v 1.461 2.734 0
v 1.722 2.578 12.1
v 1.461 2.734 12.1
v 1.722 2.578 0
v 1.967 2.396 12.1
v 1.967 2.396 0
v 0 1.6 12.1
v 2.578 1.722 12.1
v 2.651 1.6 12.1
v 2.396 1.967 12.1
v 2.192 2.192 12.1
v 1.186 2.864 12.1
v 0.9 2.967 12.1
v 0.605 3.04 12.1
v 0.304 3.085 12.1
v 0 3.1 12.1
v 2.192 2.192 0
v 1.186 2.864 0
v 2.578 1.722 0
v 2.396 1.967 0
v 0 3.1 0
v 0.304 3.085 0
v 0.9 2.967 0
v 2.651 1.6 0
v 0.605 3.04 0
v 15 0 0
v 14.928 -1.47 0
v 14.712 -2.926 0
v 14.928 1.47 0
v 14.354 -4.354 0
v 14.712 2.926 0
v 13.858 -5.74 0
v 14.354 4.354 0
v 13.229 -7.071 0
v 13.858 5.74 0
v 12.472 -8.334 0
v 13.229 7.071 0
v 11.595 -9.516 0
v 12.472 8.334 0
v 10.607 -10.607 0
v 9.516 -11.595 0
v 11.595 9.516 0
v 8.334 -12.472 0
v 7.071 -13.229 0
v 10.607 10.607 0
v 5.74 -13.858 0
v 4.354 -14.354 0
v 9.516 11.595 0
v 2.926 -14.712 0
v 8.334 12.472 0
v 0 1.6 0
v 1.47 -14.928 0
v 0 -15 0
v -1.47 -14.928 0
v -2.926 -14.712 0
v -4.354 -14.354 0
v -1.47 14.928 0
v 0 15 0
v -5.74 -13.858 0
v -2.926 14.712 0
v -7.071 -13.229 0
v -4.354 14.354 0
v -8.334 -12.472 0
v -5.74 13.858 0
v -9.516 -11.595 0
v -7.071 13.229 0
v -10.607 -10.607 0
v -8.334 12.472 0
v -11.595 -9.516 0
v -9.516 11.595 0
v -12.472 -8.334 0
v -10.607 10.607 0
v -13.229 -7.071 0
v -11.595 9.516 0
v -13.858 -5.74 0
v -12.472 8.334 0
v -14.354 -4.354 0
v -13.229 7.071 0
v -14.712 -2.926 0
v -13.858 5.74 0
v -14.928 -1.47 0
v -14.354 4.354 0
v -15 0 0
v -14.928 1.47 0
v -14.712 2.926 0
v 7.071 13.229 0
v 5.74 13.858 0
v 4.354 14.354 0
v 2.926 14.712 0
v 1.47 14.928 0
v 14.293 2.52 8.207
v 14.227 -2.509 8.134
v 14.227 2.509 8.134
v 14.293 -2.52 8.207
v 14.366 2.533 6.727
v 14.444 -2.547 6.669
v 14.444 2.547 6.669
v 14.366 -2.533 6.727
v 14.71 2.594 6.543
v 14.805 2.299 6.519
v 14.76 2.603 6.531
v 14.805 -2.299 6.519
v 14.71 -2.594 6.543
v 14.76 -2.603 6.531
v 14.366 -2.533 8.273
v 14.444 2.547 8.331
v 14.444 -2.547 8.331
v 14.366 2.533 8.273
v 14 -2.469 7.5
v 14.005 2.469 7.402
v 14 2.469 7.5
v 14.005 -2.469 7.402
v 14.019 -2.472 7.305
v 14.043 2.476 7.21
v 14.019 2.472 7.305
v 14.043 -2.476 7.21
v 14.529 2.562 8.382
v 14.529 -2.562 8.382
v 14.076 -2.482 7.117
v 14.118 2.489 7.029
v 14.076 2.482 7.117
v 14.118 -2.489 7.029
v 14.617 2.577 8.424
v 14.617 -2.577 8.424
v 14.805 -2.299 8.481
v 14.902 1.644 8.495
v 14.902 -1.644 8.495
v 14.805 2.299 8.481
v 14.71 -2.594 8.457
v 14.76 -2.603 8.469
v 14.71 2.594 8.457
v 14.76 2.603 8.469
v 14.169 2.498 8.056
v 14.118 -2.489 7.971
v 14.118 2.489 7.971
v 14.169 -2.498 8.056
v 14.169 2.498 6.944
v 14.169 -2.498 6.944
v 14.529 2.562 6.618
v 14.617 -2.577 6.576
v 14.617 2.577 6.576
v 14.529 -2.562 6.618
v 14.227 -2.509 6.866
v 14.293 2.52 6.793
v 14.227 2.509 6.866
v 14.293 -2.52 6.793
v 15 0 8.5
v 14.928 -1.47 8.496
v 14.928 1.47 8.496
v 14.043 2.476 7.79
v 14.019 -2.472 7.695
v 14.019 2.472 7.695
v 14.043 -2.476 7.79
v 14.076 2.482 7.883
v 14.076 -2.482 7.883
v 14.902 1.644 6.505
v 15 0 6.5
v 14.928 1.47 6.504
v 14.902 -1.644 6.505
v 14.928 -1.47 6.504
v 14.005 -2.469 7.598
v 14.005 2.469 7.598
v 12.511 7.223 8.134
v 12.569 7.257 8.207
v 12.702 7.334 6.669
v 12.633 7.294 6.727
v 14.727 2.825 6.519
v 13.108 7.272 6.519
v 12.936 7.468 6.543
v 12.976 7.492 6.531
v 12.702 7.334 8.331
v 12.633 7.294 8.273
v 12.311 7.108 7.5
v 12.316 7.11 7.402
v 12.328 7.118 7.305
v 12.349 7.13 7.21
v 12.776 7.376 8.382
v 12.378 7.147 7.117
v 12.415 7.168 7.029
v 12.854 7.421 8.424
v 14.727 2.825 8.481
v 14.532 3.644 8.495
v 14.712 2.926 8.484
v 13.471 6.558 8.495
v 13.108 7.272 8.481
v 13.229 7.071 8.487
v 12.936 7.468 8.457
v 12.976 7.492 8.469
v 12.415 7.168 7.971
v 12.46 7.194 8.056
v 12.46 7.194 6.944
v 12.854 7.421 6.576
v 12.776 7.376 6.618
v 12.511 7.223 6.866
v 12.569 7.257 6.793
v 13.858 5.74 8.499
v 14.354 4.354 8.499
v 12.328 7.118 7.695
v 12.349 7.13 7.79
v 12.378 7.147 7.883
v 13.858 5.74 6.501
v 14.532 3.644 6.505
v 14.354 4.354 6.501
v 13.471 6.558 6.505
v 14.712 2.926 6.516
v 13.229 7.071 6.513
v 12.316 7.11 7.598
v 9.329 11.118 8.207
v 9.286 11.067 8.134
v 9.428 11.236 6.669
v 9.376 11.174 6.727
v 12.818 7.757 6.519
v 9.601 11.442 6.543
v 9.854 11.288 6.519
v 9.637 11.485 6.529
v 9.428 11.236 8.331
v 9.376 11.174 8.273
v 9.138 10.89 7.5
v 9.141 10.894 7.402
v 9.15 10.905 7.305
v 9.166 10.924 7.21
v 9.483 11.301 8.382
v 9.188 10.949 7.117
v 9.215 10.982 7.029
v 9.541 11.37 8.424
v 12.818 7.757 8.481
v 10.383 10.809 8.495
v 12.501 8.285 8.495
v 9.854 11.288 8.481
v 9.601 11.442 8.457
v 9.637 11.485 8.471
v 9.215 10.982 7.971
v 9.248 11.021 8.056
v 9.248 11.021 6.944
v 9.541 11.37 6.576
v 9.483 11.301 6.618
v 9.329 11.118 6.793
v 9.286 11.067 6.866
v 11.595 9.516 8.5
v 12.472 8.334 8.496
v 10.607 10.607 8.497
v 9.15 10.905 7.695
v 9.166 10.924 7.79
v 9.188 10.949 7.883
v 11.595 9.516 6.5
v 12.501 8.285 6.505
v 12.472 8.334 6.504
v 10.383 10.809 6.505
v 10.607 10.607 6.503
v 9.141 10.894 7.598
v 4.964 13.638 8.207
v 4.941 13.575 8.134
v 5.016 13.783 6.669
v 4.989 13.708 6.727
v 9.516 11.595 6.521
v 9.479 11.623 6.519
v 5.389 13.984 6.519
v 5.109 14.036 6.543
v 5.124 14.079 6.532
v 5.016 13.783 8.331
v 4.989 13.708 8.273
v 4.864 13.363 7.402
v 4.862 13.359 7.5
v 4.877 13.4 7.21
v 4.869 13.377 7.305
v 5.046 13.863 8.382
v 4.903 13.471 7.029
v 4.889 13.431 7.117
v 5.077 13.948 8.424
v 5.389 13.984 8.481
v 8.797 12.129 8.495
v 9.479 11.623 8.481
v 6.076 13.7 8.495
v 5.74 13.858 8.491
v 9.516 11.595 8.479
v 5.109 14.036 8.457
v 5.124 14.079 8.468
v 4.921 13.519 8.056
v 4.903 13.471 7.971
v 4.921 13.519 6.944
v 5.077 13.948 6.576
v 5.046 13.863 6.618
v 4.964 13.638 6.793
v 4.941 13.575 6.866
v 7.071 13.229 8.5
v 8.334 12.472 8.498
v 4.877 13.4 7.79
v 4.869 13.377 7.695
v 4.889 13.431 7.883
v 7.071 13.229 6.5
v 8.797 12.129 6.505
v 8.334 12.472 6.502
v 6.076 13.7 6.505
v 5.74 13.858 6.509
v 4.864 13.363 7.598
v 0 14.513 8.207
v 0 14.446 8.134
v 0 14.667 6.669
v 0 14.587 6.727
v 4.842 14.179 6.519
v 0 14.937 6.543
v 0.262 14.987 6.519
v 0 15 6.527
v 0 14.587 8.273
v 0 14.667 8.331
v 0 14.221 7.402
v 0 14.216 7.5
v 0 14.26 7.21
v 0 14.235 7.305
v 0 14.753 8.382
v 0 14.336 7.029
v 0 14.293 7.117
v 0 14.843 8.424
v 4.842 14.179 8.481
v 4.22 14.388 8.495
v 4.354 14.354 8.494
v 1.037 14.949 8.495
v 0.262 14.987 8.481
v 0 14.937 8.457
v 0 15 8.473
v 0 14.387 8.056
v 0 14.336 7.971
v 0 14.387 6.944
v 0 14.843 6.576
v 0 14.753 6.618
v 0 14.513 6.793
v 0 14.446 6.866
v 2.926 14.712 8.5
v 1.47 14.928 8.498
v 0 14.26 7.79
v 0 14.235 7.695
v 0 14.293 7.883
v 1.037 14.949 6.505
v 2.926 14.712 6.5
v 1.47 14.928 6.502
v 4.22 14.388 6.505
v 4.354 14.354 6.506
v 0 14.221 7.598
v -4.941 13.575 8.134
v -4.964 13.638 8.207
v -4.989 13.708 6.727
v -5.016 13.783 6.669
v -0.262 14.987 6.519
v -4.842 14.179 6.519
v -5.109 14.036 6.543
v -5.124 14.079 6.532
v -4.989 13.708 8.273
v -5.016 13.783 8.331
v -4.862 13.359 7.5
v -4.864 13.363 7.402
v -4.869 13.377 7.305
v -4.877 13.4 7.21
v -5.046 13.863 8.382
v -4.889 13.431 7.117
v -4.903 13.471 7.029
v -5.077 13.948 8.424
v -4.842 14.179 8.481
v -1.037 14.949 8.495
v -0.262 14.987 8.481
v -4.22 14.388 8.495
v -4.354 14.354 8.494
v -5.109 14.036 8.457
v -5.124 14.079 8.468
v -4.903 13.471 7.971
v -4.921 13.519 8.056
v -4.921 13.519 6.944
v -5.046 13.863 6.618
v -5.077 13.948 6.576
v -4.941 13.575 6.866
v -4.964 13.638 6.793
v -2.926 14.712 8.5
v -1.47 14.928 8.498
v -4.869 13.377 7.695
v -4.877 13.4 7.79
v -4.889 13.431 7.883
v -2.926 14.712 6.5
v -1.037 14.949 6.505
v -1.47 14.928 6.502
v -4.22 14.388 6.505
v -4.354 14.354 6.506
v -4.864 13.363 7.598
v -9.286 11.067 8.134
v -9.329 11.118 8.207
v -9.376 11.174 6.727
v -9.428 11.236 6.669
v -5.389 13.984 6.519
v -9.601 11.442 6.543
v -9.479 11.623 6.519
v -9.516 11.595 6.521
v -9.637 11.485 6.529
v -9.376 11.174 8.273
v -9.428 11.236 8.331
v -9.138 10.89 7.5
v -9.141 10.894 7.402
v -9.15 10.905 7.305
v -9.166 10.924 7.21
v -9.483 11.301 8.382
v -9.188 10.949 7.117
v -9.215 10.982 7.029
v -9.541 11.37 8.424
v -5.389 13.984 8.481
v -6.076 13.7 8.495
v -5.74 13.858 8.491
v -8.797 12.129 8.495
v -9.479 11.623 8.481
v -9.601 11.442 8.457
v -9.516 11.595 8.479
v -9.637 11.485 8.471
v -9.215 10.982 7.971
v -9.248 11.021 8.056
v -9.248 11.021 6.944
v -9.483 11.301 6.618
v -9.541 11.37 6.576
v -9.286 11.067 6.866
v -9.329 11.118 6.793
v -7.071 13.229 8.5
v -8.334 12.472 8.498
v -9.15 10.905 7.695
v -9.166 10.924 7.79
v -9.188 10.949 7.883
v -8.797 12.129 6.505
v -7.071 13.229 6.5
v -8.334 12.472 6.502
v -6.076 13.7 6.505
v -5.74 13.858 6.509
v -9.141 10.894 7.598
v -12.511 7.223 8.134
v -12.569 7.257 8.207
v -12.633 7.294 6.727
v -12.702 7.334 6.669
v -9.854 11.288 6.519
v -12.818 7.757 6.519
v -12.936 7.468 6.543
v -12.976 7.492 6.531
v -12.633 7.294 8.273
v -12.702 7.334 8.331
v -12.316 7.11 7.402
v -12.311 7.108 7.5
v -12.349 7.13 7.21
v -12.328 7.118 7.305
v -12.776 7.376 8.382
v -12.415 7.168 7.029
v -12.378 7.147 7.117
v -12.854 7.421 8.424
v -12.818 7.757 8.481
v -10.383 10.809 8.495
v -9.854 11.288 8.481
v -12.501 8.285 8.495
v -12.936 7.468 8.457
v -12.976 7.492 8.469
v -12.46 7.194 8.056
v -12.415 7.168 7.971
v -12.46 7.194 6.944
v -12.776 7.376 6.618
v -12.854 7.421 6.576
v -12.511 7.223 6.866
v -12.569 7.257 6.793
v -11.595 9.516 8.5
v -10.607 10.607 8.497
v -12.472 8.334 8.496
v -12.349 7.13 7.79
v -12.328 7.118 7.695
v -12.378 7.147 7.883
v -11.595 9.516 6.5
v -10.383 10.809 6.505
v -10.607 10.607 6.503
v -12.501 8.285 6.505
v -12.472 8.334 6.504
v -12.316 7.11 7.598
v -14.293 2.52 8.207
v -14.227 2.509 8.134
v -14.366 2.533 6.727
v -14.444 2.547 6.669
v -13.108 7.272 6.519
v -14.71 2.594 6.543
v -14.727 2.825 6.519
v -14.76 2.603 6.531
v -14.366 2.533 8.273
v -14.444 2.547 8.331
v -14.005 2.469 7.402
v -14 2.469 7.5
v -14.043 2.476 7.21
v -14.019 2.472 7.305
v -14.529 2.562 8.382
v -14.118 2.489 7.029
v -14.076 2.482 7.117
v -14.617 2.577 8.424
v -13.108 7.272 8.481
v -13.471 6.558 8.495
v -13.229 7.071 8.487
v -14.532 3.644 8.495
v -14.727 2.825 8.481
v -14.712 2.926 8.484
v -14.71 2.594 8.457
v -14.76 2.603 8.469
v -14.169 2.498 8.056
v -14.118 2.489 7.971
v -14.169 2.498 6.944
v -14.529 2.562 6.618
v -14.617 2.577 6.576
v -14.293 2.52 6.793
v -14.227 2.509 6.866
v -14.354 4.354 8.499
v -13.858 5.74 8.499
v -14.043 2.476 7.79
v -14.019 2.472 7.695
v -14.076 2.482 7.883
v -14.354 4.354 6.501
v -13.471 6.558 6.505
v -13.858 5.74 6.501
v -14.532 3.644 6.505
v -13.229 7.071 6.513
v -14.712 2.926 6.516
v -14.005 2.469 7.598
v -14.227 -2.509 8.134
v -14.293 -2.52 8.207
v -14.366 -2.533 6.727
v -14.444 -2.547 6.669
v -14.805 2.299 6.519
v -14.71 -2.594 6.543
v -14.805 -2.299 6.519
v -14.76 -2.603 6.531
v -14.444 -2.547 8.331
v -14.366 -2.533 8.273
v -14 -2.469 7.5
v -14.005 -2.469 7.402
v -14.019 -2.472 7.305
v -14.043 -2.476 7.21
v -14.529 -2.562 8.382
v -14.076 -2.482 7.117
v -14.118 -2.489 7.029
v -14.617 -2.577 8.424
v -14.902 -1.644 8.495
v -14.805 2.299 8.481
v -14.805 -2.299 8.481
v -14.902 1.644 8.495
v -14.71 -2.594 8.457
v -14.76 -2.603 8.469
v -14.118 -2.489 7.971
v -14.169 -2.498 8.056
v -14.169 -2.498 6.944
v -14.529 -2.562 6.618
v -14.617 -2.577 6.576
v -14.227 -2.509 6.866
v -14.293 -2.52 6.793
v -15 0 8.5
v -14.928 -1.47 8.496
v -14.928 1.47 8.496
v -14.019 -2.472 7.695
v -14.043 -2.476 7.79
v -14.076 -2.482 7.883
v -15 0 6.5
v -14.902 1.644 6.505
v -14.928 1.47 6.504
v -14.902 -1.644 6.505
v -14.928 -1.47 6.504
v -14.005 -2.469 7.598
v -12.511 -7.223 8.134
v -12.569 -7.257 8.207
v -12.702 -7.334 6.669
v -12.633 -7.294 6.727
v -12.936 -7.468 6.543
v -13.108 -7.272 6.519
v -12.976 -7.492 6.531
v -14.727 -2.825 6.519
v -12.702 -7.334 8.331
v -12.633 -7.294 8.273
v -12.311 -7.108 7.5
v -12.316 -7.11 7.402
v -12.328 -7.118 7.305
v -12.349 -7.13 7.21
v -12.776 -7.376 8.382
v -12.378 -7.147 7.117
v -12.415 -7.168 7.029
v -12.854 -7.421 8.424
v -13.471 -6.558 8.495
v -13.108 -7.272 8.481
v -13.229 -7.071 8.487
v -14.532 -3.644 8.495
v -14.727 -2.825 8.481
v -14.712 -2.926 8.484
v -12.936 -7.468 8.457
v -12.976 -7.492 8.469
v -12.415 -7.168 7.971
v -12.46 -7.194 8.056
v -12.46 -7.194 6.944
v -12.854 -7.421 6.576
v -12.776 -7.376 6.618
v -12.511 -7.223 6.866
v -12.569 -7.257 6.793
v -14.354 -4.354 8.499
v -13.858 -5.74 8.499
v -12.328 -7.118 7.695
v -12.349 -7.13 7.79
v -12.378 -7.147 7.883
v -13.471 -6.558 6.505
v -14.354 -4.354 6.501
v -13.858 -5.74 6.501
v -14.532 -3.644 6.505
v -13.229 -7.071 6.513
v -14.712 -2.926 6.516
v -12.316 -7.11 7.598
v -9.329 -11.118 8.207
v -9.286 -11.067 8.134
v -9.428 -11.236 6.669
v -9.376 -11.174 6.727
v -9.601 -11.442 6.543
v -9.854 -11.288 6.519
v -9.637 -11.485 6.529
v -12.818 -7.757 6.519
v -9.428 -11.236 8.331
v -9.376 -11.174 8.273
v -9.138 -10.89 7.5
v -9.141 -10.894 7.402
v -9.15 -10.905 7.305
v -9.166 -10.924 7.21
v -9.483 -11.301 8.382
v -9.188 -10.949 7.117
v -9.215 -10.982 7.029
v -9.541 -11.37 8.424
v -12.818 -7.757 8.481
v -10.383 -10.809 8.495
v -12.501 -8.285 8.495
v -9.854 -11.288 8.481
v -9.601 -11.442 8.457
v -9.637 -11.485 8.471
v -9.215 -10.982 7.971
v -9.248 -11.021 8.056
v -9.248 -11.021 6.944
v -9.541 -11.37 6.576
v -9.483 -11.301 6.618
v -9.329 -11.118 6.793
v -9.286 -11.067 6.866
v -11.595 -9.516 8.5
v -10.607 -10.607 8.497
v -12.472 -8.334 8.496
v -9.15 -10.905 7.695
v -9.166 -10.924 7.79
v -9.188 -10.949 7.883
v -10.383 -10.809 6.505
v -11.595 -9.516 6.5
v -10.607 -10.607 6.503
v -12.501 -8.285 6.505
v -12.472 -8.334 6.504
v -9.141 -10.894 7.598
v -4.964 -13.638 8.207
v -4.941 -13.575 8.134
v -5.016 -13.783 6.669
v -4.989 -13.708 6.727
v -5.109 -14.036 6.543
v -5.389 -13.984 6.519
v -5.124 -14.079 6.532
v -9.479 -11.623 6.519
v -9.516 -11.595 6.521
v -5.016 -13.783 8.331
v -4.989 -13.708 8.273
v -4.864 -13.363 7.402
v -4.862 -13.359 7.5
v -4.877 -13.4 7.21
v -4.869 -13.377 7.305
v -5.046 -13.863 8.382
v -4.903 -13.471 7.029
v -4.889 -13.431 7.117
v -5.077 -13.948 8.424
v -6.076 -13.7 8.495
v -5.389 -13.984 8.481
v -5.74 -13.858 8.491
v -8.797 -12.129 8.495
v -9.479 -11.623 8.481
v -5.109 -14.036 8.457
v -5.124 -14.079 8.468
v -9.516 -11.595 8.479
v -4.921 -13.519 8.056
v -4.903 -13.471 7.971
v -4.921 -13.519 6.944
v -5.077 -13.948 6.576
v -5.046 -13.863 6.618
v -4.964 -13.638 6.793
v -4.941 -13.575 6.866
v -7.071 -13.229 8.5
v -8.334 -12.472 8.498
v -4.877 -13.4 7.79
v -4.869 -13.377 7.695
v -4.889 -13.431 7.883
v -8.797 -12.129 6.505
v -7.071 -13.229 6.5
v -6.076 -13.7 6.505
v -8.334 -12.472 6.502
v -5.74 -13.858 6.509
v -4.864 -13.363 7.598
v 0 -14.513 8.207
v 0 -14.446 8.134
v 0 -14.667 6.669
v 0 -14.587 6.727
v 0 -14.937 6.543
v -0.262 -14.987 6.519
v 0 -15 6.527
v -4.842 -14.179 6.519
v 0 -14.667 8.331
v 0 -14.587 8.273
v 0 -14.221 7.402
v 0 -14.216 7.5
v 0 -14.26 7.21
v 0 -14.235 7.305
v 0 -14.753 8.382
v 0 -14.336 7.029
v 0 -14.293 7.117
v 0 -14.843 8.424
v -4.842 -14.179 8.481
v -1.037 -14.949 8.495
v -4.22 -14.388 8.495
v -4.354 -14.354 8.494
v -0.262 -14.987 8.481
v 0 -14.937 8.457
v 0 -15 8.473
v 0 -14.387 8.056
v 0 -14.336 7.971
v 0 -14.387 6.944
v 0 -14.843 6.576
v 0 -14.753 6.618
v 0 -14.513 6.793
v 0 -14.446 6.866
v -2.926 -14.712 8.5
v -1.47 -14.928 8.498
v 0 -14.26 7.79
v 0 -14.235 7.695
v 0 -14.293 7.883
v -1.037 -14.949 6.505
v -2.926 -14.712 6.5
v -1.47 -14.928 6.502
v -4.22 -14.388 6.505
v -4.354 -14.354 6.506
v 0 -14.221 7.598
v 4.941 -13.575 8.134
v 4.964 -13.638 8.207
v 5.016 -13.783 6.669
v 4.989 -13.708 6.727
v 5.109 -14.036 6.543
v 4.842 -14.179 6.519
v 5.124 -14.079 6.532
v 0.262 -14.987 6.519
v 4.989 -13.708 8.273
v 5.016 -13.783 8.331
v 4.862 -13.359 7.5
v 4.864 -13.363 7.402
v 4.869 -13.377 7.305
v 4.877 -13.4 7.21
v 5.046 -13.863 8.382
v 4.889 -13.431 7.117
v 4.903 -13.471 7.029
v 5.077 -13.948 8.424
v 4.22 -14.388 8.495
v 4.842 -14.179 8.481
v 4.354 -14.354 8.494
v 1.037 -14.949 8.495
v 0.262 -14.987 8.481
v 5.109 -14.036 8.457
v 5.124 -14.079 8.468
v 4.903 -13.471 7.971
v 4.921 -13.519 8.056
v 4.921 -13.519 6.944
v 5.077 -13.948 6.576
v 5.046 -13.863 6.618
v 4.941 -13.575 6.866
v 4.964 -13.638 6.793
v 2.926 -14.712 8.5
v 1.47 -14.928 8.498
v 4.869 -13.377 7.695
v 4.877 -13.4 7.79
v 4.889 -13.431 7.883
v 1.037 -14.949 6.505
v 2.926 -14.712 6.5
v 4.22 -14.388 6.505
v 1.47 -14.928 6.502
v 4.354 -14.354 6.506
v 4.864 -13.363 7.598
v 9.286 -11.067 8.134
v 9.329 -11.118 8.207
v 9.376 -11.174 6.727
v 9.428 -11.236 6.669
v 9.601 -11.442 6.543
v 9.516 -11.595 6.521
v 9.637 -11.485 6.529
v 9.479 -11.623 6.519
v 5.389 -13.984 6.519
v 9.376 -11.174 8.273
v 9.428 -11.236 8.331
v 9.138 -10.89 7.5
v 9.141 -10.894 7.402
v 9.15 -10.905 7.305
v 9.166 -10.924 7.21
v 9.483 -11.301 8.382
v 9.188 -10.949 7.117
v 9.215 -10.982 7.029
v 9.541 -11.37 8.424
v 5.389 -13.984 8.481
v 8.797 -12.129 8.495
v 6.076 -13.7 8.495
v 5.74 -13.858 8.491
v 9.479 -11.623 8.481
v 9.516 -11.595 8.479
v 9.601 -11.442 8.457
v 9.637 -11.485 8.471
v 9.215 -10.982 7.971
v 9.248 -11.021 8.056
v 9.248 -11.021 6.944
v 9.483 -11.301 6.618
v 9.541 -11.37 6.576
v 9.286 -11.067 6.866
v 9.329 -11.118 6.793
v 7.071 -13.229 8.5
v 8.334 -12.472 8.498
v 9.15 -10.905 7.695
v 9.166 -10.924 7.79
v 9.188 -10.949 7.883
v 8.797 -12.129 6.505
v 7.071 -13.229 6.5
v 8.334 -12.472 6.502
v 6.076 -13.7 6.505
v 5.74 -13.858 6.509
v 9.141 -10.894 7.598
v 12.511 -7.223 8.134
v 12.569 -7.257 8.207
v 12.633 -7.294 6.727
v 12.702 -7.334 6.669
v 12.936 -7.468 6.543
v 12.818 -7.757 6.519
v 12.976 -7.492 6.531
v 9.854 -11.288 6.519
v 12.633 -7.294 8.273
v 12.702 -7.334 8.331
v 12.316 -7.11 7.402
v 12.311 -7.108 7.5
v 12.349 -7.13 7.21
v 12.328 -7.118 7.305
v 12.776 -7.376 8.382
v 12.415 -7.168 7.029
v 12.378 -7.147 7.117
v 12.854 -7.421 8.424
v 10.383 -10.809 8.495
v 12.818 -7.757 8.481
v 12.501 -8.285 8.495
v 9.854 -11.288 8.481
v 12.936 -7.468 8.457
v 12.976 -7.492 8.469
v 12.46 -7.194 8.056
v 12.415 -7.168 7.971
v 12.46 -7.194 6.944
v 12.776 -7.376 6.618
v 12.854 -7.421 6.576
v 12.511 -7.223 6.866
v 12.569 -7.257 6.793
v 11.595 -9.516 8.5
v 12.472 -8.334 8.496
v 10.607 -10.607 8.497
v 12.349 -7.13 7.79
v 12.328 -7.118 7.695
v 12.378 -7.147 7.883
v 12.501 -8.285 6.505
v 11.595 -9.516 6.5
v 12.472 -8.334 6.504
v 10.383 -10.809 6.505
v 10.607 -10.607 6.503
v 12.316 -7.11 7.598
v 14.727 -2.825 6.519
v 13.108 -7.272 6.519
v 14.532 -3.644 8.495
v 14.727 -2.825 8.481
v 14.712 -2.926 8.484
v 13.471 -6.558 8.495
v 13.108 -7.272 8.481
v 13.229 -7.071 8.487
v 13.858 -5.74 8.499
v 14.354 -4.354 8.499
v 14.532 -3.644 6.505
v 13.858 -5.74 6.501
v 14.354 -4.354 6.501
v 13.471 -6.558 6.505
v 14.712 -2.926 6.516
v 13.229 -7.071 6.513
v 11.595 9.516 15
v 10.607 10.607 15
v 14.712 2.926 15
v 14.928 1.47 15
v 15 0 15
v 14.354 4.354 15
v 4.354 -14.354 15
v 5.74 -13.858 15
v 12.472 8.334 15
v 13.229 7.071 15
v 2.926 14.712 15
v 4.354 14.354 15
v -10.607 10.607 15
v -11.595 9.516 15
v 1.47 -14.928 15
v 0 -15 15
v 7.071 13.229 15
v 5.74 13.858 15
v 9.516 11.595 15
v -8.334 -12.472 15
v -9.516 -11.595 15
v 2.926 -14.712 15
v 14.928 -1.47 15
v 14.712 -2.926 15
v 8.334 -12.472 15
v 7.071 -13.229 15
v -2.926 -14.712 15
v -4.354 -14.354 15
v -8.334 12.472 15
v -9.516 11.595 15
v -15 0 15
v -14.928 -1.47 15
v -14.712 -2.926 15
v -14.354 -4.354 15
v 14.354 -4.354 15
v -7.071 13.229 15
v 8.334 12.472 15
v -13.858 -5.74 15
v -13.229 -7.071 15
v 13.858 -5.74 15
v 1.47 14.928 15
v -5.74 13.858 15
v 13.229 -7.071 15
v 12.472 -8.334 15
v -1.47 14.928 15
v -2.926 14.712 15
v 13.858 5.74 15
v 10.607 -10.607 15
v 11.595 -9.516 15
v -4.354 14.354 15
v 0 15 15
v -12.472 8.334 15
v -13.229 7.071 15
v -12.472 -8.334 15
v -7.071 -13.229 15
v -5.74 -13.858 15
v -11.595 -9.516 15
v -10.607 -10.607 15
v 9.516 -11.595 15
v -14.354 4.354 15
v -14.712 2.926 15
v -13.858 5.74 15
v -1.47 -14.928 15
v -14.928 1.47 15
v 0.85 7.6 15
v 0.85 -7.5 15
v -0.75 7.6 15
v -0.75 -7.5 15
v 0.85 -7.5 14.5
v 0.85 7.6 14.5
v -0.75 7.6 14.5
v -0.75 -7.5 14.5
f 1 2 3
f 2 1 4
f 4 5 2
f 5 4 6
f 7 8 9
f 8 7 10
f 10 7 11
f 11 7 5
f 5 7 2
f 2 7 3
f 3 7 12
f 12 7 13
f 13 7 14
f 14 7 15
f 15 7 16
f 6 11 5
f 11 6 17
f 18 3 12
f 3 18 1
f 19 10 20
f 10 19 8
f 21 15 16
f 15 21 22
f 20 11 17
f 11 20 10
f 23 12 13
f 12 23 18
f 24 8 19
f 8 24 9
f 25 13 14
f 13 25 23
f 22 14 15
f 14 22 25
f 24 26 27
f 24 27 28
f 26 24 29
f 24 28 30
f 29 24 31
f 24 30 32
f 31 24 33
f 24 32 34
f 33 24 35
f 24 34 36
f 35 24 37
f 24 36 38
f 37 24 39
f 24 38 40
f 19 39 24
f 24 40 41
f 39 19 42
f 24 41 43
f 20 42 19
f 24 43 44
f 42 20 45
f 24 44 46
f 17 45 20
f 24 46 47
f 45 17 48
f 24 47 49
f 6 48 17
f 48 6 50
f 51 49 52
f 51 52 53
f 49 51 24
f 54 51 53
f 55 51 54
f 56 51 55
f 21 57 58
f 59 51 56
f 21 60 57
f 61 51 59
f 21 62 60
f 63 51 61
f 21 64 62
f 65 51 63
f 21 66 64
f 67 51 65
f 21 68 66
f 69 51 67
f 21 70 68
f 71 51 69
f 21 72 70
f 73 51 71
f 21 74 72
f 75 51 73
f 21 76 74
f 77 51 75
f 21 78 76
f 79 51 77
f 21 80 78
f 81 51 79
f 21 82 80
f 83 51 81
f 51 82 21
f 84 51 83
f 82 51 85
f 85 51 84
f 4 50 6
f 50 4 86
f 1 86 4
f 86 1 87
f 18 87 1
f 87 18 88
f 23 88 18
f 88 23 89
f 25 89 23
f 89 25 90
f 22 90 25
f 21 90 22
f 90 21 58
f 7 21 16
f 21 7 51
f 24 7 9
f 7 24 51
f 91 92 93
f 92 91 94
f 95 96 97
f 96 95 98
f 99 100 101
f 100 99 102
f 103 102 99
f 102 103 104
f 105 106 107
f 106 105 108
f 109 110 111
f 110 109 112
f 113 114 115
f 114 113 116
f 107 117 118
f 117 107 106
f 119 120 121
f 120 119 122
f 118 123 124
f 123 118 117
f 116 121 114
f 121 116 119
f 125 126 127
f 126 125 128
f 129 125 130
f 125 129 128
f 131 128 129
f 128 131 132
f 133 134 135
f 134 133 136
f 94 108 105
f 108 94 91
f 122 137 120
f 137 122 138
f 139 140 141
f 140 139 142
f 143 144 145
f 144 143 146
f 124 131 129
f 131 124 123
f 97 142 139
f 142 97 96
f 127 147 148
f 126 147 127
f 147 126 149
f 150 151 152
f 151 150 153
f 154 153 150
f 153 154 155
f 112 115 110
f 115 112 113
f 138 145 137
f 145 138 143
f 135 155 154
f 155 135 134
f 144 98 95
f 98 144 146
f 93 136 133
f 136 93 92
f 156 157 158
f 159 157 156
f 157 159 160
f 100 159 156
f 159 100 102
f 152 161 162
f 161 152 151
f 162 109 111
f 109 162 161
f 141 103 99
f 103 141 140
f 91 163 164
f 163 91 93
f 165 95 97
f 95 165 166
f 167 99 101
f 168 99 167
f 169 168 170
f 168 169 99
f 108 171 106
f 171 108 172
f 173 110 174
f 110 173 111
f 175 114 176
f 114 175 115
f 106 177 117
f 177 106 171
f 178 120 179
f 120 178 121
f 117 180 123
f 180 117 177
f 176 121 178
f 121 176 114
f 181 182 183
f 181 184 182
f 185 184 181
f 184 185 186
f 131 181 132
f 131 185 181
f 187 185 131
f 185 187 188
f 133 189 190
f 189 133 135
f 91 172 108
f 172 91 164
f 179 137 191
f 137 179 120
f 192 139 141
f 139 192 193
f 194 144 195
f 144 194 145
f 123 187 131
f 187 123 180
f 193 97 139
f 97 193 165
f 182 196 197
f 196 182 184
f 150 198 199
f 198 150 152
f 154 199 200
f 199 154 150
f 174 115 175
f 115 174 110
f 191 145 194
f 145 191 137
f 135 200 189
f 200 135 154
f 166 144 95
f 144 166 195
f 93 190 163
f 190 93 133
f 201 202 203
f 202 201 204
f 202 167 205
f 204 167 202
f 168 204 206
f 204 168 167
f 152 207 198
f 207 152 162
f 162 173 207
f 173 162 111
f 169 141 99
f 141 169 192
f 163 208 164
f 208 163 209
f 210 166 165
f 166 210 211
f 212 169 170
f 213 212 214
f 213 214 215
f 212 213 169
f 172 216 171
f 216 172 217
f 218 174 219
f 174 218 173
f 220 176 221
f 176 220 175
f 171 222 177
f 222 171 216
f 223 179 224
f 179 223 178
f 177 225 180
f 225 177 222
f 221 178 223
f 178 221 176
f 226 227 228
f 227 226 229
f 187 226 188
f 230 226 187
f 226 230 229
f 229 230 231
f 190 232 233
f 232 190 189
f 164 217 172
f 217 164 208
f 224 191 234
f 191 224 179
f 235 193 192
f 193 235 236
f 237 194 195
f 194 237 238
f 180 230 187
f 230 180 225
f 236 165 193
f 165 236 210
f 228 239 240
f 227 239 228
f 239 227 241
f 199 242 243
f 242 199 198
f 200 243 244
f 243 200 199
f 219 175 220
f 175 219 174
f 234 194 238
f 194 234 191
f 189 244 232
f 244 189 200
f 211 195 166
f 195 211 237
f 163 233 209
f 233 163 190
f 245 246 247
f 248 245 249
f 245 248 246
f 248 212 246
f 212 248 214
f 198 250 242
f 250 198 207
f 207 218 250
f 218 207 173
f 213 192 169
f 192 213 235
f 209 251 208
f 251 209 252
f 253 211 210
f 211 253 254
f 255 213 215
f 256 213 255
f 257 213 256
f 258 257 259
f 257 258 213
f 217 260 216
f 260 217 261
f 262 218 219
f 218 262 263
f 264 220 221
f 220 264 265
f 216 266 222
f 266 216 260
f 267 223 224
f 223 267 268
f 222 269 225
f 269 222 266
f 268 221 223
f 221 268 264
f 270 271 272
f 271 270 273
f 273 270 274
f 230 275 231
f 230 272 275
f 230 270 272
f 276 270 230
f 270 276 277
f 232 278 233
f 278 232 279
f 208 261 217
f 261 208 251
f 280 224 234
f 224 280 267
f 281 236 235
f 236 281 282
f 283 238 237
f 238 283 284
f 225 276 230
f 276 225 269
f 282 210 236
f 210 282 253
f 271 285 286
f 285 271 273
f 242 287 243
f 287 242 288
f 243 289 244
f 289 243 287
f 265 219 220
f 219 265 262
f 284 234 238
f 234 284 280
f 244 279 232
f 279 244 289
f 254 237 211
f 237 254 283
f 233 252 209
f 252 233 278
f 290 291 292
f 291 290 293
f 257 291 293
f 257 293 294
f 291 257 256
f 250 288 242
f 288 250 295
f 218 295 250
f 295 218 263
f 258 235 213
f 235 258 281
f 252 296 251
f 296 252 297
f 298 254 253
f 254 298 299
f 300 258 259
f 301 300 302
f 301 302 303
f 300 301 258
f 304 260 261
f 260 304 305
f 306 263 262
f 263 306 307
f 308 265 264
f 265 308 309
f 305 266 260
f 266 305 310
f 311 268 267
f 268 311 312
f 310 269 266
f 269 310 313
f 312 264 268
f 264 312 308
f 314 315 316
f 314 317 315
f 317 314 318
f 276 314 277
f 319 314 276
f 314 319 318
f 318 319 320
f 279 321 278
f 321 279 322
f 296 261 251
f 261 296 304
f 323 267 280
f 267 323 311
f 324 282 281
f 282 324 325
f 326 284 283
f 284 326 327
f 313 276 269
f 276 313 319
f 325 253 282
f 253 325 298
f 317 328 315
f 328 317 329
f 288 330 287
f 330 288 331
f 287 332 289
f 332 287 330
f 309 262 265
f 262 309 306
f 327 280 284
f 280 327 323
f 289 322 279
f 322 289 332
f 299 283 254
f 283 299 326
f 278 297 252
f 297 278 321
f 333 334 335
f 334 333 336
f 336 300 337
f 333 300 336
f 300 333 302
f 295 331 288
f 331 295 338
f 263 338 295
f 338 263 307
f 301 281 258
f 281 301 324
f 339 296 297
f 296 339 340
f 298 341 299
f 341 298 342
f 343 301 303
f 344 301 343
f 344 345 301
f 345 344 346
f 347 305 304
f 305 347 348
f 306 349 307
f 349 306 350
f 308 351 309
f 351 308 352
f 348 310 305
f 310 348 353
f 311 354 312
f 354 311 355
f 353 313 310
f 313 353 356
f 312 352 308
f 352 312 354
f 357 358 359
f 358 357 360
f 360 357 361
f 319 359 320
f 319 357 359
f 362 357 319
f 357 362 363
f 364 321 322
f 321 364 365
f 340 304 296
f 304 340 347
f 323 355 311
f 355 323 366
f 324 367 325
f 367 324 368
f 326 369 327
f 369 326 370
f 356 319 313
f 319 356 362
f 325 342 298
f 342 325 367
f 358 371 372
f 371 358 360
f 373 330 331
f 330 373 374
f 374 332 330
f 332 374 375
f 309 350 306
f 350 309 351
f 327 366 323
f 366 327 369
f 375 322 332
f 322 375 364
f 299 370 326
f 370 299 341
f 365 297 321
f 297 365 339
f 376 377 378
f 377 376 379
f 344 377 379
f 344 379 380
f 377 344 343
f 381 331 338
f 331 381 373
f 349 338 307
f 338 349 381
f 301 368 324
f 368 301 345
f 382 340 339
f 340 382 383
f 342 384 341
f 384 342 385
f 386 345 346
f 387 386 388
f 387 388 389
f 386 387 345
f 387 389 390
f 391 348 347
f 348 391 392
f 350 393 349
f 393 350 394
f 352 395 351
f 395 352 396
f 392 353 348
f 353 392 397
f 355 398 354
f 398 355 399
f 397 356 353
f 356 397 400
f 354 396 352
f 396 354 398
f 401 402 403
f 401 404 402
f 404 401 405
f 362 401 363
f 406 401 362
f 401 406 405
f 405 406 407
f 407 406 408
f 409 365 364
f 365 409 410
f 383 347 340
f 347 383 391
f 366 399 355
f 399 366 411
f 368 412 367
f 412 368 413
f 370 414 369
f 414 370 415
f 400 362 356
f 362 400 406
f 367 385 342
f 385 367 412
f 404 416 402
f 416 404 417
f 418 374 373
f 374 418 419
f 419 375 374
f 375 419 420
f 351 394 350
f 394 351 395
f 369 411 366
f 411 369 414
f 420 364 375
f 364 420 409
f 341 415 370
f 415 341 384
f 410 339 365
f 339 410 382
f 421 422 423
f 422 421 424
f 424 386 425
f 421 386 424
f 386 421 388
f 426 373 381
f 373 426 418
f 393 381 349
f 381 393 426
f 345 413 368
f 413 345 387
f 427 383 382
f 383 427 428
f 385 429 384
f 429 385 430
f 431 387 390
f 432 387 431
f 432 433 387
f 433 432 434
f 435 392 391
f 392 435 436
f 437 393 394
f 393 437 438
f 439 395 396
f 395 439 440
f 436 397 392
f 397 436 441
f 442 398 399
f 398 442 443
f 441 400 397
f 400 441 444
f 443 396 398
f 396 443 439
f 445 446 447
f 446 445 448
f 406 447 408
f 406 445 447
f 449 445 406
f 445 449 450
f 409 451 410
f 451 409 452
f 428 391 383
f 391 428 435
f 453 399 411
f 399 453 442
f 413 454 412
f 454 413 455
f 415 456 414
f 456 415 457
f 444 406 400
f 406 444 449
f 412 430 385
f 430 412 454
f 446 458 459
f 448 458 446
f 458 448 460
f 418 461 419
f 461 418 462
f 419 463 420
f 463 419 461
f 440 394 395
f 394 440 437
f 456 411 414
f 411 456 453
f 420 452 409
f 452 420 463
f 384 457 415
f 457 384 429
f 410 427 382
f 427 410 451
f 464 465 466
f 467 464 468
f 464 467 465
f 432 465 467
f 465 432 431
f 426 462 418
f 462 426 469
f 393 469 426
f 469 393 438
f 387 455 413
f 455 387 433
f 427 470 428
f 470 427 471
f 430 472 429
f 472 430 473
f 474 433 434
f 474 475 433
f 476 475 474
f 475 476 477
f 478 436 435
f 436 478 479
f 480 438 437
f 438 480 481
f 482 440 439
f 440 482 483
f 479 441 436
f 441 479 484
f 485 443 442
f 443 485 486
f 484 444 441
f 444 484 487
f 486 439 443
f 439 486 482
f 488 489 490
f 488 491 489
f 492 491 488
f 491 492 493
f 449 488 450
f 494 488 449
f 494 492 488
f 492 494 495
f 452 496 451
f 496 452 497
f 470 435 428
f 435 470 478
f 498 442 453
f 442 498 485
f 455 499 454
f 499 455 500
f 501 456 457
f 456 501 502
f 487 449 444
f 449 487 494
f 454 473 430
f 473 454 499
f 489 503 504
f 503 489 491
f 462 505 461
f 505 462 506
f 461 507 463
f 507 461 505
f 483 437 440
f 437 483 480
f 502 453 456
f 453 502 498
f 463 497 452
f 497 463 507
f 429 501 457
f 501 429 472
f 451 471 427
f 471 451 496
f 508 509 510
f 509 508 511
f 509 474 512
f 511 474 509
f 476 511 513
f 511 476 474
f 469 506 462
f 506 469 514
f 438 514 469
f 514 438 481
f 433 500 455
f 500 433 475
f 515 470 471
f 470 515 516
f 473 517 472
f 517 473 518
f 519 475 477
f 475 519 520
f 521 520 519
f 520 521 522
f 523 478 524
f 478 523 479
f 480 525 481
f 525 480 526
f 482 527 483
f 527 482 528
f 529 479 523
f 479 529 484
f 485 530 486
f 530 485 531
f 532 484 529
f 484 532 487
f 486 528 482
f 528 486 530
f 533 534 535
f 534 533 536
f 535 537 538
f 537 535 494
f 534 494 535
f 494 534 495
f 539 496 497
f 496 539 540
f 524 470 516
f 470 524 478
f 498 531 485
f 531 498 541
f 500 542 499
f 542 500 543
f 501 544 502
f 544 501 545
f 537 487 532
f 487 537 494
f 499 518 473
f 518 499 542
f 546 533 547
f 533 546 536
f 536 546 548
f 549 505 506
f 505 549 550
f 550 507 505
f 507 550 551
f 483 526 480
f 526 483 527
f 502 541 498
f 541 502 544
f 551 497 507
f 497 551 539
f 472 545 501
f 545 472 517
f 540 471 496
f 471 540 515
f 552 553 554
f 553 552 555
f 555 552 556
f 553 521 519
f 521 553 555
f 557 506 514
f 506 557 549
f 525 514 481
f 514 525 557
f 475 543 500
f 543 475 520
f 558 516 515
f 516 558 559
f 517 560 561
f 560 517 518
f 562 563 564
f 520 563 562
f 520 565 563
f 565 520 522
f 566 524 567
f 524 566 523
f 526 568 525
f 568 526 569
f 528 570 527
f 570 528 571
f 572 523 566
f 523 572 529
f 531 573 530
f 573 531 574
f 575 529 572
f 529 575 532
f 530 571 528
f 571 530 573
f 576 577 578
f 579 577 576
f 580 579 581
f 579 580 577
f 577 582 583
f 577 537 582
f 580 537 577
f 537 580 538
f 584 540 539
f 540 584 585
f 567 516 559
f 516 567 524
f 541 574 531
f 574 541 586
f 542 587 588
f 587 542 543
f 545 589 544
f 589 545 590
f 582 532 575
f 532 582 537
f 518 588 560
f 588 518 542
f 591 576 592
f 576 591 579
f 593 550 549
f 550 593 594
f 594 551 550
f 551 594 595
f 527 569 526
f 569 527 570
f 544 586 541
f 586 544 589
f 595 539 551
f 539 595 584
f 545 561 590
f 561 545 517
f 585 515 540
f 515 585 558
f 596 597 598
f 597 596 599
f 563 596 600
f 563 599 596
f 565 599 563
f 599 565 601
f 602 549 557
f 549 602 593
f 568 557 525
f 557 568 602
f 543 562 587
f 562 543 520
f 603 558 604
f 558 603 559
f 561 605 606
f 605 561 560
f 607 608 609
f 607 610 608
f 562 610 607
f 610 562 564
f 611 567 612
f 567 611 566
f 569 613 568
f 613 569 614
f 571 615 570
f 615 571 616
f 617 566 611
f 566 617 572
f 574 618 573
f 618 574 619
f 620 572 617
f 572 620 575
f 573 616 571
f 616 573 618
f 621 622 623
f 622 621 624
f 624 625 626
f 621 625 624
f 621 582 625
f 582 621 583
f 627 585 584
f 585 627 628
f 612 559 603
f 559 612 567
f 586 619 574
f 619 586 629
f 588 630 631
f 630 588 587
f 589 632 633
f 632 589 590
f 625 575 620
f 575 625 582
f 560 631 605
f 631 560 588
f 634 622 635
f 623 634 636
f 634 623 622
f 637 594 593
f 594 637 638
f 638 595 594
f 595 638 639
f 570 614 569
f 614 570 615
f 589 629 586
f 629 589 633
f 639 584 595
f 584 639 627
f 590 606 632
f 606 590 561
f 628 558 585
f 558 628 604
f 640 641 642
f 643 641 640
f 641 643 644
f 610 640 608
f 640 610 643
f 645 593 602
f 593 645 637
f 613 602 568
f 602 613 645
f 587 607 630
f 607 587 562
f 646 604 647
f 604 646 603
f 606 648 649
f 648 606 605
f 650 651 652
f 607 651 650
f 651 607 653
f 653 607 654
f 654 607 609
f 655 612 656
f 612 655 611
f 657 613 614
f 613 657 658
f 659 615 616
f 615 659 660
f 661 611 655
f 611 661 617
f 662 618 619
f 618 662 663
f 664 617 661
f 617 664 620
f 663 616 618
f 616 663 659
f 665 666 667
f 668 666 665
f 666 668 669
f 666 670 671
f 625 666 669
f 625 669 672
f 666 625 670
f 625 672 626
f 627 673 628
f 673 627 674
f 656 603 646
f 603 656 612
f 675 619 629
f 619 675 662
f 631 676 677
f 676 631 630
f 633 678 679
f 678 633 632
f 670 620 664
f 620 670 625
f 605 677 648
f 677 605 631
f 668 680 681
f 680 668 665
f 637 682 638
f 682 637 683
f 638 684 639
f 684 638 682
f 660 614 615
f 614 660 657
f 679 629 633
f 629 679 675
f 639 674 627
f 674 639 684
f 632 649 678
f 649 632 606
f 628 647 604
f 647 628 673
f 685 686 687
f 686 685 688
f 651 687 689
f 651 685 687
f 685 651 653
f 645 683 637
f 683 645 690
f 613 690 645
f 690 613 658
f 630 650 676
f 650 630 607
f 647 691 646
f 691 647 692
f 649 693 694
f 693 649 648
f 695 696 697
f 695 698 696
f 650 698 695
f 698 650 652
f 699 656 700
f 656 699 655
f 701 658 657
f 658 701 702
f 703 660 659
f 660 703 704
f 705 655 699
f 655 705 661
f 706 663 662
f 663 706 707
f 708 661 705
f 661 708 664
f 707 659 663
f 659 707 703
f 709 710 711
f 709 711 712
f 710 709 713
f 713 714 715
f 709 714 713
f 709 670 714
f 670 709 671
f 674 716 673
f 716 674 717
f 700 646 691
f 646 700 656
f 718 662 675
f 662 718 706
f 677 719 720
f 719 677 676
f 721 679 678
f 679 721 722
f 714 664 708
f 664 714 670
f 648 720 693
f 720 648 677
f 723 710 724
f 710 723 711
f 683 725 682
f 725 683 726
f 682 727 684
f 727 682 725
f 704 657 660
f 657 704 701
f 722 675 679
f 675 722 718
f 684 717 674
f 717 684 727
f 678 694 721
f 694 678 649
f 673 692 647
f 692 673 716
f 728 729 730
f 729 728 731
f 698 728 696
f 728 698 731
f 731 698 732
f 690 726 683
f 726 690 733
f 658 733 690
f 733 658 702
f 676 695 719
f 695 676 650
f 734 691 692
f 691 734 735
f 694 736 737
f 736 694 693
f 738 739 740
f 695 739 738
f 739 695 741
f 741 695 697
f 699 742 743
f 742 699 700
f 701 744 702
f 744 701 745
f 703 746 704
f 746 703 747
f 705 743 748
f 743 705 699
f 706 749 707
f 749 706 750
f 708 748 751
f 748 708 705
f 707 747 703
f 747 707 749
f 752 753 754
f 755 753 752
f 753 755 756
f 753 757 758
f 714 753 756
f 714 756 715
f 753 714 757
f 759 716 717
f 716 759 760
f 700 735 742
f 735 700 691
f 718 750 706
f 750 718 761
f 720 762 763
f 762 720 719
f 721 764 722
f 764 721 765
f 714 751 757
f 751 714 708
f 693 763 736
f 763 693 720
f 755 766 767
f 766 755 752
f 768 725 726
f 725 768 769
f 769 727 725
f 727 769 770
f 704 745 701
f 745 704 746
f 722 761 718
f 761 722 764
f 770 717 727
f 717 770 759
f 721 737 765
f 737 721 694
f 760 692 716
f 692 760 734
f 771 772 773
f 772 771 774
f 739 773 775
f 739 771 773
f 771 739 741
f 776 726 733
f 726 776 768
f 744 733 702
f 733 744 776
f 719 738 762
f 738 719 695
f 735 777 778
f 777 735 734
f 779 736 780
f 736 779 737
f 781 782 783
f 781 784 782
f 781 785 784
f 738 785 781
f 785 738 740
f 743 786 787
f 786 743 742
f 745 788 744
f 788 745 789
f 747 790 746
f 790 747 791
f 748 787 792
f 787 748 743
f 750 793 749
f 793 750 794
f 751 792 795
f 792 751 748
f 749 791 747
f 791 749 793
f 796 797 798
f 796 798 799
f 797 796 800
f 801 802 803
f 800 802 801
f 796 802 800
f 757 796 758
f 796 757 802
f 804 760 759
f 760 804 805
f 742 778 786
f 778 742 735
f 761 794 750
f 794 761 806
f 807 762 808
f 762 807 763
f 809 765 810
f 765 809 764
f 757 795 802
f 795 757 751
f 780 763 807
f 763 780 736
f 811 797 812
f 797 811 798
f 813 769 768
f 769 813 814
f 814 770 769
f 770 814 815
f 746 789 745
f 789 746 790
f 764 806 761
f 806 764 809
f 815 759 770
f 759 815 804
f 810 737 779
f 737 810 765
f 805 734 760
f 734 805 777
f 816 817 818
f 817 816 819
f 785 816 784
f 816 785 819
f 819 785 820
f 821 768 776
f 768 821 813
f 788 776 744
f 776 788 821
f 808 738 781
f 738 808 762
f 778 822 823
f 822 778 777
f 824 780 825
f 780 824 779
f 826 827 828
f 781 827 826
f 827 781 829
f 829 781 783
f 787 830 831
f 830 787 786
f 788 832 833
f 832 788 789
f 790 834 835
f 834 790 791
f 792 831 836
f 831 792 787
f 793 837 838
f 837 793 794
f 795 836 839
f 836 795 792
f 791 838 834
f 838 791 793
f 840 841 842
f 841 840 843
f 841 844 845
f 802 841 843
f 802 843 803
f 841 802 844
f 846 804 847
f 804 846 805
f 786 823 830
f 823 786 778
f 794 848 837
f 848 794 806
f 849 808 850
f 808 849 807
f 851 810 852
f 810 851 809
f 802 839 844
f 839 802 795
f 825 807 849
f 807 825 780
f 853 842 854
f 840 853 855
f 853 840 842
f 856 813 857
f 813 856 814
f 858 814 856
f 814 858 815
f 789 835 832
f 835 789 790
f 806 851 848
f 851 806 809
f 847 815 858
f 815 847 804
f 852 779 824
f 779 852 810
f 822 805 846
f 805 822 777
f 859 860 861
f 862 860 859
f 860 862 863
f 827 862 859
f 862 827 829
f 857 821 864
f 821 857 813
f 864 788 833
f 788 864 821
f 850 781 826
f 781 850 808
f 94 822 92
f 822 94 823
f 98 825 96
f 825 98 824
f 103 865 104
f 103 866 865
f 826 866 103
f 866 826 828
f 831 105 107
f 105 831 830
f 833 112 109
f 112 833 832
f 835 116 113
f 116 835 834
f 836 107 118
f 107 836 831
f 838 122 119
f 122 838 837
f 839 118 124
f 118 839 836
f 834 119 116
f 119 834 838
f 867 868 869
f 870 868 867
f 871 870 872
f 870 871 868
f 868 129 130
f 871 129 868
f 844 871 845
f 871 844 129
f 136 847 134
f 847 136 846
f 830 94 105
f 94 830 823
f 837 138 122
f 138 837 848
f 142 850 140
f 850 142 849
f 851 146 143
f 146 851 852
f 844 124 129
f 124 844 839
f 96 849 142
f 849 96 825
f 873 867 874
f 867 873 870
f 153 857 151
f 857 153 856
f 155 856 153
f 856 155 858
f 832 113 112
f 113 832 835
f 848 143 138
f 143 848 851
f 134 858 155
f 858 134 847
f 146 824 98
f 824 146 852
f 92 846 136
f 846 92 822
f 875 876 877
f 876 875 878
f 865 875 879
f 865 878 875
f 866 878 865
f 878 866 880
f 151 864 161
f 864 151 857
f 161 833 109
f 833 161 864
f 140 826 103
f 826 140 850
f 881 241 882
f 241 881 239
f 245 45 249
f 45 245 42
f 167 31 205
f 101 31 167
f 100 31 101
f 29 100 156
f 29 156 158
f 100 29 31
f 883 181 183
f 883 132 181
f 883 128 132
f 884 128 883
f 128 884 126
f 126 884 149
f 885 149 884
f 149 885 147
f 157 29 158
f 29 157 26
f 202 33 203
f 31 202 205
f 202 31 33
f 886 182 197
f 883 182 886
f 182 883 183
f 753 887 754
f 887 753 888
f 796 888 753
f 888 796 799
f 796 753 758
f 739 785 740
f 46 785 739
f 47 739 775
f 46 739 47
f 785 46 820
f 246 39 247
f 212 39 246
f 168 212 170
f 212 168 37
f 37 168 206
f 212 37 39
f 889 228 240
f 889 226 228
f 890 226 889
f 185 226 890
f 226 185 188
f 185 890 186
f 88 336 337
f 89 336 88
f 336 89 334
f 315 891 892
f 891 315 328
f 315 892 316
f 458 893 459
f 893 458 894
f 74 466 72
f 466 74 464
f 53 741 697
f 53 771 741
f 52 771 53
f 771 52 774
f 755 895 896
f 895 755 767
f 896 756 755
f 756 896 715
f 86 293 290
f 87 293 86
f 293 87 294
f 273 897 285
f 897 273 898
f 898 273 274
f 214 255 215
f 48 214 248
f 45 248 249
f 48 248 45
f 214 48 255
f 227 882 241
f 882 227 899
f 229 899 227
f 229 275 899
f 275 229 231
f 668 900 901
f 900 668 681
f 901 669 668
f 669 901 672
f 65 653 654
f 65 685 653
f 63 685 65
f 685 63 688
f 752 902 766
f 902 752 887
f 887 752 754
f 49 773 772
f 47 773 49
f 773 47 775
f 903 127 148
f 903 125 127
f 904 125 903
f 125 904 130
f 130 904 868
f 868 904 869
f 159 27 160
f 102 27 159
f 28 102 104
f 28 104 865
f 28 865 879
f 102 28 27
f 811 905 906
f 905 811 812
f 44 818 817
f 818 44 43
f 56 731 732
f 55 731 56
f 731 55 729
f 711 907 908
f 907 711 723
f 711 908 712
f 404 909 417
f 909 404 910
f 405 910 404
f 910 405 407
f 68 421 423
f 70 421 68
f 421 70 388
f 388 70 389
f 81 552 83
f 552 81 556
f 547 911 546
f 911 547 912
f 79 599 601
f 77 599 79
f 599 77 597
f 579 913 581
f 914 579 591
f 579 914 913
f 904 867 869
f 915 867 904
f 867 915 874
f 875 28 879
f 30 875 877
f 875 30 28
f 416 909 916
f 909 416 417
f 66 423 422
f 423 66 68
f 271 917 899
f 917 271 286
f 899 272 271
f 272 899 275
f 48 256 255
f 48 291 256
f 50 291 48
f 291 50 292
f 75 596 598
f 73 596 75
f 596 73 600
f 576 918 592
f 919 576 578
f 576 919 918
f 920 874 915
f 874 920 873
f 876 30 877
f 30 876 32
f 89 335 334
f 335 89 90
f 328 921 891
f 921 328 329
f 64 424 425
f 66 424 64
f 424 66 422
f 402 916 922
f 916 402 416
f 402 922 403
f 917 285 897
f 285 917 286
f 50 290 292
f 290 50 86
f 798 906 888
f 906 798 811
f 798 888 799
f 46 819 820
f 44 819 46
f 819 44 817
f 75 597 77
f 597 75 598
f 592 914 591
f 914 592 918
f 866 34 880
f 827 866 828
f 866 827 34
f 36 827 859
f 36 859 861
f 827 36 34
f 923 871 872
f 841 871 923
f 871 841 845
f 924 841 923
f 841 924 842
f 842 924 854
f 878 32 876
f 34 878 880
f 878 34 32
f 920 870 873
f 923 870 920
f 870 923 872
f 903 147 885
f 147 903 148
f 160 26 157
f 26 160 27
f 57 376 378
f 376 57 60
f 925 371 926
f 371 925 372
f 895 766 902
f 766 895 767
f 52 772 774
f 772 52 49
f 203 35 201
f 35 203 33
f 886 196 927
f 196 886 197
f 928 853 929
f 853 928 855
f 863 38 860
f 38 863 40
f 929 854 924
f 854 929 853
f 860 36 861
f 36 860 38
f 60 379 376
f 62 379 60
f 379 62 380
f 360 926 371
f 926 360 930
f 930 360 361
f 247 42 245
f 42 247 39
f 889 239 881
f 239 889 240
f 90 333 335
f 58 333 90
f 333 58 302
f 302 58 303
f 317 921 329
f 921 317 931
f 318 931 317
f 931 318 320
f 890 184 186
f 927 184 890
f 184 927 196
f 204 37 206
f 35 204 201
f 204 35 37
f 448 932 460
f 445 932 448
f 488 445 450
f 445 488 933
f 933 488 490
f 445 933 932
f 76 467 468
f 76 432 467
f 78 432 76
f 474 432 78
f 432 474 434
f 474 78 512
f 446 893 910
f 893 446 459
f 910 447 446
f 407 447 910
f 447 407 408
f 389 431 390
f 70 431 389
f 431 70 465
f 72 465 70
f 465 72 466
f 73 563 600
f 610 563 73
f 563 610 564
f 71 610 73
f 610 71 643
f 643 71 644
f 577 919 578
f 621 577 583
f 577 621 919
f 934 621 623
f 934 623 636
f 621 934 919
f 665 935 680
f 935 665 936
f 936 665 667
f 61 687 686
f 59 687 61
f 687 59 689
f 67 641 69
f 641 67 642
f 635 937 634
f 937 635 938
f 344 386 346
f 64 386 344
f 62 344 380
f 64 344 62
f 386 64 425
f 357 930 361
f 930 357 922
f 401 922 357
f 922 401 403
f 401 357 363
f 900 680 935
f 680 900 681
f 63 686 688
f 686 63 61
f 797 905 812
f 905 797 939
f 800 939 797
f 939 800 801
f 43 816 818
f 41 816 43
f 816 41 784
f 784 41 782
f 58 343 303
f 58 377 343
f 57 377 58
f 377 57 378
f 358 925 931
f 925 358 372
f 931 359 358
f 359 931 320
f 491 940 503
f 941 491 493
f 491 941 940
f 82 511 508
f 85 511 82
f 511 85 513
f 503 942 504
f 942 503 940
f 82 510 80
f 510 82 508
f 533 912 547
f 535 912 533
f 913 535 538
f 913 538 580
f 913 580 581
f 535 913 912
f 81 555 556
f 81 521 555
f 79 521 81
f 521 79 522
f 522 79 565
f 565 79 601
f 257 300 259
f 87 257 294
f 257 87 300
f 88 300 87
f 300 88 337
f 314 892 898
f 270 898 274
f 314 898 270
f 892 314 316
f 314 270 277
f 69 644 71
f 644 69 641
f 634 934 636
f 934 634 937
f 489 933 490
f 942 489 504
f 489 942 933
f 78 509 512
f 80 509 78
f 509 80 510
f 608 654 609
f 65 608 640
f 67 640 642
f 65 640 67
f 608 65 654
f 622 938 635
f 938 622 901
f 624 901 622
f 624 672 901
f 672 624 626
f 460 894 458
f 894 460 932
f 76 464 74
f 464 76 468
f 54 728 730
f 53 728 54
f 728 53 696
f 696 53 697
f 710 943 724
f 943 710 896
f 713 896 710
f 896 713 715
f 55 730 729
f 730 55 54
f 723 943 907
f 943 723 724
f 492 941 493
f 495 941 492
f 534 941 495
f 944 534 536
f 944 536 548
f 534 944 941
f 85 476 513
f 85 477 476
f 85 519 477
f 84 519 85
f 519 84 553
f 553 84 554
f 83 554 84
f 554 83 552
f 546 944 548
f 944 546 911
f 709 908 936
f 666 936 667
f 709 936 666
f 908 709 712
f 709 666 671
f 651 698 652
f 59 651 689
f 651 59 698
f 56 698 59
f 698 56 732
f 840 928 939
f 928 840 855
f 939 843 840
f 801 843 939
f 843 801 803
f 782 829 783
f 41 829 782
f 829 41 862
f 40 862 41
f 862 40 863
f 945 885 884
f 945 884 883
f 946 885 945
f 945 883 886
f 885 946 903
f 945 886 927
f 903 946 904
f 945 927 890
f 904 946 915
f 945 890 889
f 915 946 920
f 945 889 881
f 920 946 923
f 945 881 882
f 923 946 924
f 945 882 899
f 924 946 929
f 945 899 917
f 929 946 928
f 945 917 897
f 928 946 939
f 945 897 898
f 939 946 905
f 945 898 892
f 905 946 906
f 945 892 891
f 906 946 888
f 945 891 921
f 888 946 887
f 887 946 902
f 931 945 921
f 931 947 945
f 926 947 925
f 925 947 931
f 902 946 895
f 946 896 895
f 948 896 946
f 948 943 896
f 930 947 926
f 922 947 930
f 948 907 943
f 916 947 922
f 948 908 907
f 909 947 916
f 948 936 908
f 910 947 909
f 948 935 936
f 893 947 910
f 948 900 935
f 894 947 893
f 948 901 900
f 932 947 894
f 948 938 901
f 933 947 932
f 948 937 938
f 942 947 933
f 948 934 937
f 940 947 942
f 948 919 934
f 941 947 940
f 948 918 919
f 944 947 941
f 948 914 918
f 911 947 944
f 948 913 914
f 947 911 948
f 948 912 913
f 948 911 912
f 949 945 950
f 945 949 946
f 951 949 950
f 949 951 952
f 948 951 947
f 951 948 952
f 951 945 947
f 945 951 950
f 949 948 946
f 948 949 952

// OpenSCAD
// Replacement knob for hotplate stirrer
// Dimensions measured with calipers

// Main knob dimensions
knob_diameter = 30;
knob_radius = knob_diameter / 2;
knob_height = 15;

// D-shaft blind bore dimensions
bore_diameter = 6.2;
bore_radius = bore_diameter / 2;
bore_depth = 12;
// Distance from flat to opposite side of circle is 4.7 mm
// This means the flat is offset from the center by (radius - 4.7)
bore_flat_offset = bore_radius - 4.7; // 3.1 - 4.7 = -1.6 mm (flat is 1.6 mm below center)

// Grip grooves
num_grooves = 18;
groove_diameter = 2;
groove_radius = groove_diameter / 2;

// Pointer groove on top face
pointer_width = 1.5;
pointer_depth = 1;
pointer_length = knob_radius; // from center to edge

// Print quality
$fn = 64;

// Full assembly with all cuts
difference() {
    // Main knob
    cylinder(h = knob_height, r = knob_radius, center = false);
    
    // D-shaped blind bore
    // Create D-shape: cylinder intersected with half-space
    // The flat is at y = -1.6 mm (1.6 mm below center)
    // We keep the part of the cylinder where y >= -1.6
    translate([0, 0, 0]) {
        intersection() {
            cylinder(h = bore_depth + 0.1, r = bore_radius, center = false);
            // Half-space: y >= -bore_flat_offset
            // Represent as a large box starting at y = -bore_flat_offset
            translate([0, -bore_flat_offset, 0])
            cube([knob_diameter + 2, knob_diameter + 2, bore_depth + 1], center = false);
        }
    }
    
    // Grip grooves: 18 evenly spaced vertical half-cylinders on the outer surface
    for (i = [0 : num_grooves - 1]) {
        angle = i * 360 / num_grooves;
        // Position the groove on the outer surface
        // The groove is a half-cylinder centered on the surface
        // So its center is at radius = knob_radius
        // The half-cylinder is cut so that only the inner half remains (facing the center)
        
        translate([0, 0, 0])
        rotate([0, 0, angle])
        translate([knob_radius, 0, knob_height / 2])
        rotate([90, 0, 0])
        // Half-cylinder: cylinder intersected with half-space
        intersection() {
            cylinder(h = knob_height + 0.1, r = groove_radius, center = true);
            // Keep the part facing inward (negative x in local coords)
            // The cylinder is along Z (local), so we cut along X
            // We want the half where x <= 0 (facing center of knob)
            translate([-groove_radius, -groove_radius, -knob_height/2 - 0.05])
            cube([groove_radius + 0.1, groove_radius * 2 + 0.1, knob_height + 0.1], center = false);
        }
    }
    
    // Pointer groove on top face
    // 1.5 mm wide, 1 mm deep, from center to edge
    // On the same side as the flat of the D (negative y side)
    translate([0, 0, knob_height]) {
        // Slot: rectangular prism
        // Width in x-direction (1.5 mm), length in y-direction (from 0 to -knob_radius)
        // Depth in z-direction (1 mm, going down)
        
        // Center of the slot in x is 0, in y is -pointer_length/2
        // The slot extends from y=0 to y=-pointer_length
        // So we place the cube such that it covers this range
        
        translate([-pointer_width / 2, -pointer_length / 2, -pointer_depth / 2])
        cube([pointer_width + 0.1, pointer_length + 0.1, pointer_depth + 0.1], center = false);
    }
}
